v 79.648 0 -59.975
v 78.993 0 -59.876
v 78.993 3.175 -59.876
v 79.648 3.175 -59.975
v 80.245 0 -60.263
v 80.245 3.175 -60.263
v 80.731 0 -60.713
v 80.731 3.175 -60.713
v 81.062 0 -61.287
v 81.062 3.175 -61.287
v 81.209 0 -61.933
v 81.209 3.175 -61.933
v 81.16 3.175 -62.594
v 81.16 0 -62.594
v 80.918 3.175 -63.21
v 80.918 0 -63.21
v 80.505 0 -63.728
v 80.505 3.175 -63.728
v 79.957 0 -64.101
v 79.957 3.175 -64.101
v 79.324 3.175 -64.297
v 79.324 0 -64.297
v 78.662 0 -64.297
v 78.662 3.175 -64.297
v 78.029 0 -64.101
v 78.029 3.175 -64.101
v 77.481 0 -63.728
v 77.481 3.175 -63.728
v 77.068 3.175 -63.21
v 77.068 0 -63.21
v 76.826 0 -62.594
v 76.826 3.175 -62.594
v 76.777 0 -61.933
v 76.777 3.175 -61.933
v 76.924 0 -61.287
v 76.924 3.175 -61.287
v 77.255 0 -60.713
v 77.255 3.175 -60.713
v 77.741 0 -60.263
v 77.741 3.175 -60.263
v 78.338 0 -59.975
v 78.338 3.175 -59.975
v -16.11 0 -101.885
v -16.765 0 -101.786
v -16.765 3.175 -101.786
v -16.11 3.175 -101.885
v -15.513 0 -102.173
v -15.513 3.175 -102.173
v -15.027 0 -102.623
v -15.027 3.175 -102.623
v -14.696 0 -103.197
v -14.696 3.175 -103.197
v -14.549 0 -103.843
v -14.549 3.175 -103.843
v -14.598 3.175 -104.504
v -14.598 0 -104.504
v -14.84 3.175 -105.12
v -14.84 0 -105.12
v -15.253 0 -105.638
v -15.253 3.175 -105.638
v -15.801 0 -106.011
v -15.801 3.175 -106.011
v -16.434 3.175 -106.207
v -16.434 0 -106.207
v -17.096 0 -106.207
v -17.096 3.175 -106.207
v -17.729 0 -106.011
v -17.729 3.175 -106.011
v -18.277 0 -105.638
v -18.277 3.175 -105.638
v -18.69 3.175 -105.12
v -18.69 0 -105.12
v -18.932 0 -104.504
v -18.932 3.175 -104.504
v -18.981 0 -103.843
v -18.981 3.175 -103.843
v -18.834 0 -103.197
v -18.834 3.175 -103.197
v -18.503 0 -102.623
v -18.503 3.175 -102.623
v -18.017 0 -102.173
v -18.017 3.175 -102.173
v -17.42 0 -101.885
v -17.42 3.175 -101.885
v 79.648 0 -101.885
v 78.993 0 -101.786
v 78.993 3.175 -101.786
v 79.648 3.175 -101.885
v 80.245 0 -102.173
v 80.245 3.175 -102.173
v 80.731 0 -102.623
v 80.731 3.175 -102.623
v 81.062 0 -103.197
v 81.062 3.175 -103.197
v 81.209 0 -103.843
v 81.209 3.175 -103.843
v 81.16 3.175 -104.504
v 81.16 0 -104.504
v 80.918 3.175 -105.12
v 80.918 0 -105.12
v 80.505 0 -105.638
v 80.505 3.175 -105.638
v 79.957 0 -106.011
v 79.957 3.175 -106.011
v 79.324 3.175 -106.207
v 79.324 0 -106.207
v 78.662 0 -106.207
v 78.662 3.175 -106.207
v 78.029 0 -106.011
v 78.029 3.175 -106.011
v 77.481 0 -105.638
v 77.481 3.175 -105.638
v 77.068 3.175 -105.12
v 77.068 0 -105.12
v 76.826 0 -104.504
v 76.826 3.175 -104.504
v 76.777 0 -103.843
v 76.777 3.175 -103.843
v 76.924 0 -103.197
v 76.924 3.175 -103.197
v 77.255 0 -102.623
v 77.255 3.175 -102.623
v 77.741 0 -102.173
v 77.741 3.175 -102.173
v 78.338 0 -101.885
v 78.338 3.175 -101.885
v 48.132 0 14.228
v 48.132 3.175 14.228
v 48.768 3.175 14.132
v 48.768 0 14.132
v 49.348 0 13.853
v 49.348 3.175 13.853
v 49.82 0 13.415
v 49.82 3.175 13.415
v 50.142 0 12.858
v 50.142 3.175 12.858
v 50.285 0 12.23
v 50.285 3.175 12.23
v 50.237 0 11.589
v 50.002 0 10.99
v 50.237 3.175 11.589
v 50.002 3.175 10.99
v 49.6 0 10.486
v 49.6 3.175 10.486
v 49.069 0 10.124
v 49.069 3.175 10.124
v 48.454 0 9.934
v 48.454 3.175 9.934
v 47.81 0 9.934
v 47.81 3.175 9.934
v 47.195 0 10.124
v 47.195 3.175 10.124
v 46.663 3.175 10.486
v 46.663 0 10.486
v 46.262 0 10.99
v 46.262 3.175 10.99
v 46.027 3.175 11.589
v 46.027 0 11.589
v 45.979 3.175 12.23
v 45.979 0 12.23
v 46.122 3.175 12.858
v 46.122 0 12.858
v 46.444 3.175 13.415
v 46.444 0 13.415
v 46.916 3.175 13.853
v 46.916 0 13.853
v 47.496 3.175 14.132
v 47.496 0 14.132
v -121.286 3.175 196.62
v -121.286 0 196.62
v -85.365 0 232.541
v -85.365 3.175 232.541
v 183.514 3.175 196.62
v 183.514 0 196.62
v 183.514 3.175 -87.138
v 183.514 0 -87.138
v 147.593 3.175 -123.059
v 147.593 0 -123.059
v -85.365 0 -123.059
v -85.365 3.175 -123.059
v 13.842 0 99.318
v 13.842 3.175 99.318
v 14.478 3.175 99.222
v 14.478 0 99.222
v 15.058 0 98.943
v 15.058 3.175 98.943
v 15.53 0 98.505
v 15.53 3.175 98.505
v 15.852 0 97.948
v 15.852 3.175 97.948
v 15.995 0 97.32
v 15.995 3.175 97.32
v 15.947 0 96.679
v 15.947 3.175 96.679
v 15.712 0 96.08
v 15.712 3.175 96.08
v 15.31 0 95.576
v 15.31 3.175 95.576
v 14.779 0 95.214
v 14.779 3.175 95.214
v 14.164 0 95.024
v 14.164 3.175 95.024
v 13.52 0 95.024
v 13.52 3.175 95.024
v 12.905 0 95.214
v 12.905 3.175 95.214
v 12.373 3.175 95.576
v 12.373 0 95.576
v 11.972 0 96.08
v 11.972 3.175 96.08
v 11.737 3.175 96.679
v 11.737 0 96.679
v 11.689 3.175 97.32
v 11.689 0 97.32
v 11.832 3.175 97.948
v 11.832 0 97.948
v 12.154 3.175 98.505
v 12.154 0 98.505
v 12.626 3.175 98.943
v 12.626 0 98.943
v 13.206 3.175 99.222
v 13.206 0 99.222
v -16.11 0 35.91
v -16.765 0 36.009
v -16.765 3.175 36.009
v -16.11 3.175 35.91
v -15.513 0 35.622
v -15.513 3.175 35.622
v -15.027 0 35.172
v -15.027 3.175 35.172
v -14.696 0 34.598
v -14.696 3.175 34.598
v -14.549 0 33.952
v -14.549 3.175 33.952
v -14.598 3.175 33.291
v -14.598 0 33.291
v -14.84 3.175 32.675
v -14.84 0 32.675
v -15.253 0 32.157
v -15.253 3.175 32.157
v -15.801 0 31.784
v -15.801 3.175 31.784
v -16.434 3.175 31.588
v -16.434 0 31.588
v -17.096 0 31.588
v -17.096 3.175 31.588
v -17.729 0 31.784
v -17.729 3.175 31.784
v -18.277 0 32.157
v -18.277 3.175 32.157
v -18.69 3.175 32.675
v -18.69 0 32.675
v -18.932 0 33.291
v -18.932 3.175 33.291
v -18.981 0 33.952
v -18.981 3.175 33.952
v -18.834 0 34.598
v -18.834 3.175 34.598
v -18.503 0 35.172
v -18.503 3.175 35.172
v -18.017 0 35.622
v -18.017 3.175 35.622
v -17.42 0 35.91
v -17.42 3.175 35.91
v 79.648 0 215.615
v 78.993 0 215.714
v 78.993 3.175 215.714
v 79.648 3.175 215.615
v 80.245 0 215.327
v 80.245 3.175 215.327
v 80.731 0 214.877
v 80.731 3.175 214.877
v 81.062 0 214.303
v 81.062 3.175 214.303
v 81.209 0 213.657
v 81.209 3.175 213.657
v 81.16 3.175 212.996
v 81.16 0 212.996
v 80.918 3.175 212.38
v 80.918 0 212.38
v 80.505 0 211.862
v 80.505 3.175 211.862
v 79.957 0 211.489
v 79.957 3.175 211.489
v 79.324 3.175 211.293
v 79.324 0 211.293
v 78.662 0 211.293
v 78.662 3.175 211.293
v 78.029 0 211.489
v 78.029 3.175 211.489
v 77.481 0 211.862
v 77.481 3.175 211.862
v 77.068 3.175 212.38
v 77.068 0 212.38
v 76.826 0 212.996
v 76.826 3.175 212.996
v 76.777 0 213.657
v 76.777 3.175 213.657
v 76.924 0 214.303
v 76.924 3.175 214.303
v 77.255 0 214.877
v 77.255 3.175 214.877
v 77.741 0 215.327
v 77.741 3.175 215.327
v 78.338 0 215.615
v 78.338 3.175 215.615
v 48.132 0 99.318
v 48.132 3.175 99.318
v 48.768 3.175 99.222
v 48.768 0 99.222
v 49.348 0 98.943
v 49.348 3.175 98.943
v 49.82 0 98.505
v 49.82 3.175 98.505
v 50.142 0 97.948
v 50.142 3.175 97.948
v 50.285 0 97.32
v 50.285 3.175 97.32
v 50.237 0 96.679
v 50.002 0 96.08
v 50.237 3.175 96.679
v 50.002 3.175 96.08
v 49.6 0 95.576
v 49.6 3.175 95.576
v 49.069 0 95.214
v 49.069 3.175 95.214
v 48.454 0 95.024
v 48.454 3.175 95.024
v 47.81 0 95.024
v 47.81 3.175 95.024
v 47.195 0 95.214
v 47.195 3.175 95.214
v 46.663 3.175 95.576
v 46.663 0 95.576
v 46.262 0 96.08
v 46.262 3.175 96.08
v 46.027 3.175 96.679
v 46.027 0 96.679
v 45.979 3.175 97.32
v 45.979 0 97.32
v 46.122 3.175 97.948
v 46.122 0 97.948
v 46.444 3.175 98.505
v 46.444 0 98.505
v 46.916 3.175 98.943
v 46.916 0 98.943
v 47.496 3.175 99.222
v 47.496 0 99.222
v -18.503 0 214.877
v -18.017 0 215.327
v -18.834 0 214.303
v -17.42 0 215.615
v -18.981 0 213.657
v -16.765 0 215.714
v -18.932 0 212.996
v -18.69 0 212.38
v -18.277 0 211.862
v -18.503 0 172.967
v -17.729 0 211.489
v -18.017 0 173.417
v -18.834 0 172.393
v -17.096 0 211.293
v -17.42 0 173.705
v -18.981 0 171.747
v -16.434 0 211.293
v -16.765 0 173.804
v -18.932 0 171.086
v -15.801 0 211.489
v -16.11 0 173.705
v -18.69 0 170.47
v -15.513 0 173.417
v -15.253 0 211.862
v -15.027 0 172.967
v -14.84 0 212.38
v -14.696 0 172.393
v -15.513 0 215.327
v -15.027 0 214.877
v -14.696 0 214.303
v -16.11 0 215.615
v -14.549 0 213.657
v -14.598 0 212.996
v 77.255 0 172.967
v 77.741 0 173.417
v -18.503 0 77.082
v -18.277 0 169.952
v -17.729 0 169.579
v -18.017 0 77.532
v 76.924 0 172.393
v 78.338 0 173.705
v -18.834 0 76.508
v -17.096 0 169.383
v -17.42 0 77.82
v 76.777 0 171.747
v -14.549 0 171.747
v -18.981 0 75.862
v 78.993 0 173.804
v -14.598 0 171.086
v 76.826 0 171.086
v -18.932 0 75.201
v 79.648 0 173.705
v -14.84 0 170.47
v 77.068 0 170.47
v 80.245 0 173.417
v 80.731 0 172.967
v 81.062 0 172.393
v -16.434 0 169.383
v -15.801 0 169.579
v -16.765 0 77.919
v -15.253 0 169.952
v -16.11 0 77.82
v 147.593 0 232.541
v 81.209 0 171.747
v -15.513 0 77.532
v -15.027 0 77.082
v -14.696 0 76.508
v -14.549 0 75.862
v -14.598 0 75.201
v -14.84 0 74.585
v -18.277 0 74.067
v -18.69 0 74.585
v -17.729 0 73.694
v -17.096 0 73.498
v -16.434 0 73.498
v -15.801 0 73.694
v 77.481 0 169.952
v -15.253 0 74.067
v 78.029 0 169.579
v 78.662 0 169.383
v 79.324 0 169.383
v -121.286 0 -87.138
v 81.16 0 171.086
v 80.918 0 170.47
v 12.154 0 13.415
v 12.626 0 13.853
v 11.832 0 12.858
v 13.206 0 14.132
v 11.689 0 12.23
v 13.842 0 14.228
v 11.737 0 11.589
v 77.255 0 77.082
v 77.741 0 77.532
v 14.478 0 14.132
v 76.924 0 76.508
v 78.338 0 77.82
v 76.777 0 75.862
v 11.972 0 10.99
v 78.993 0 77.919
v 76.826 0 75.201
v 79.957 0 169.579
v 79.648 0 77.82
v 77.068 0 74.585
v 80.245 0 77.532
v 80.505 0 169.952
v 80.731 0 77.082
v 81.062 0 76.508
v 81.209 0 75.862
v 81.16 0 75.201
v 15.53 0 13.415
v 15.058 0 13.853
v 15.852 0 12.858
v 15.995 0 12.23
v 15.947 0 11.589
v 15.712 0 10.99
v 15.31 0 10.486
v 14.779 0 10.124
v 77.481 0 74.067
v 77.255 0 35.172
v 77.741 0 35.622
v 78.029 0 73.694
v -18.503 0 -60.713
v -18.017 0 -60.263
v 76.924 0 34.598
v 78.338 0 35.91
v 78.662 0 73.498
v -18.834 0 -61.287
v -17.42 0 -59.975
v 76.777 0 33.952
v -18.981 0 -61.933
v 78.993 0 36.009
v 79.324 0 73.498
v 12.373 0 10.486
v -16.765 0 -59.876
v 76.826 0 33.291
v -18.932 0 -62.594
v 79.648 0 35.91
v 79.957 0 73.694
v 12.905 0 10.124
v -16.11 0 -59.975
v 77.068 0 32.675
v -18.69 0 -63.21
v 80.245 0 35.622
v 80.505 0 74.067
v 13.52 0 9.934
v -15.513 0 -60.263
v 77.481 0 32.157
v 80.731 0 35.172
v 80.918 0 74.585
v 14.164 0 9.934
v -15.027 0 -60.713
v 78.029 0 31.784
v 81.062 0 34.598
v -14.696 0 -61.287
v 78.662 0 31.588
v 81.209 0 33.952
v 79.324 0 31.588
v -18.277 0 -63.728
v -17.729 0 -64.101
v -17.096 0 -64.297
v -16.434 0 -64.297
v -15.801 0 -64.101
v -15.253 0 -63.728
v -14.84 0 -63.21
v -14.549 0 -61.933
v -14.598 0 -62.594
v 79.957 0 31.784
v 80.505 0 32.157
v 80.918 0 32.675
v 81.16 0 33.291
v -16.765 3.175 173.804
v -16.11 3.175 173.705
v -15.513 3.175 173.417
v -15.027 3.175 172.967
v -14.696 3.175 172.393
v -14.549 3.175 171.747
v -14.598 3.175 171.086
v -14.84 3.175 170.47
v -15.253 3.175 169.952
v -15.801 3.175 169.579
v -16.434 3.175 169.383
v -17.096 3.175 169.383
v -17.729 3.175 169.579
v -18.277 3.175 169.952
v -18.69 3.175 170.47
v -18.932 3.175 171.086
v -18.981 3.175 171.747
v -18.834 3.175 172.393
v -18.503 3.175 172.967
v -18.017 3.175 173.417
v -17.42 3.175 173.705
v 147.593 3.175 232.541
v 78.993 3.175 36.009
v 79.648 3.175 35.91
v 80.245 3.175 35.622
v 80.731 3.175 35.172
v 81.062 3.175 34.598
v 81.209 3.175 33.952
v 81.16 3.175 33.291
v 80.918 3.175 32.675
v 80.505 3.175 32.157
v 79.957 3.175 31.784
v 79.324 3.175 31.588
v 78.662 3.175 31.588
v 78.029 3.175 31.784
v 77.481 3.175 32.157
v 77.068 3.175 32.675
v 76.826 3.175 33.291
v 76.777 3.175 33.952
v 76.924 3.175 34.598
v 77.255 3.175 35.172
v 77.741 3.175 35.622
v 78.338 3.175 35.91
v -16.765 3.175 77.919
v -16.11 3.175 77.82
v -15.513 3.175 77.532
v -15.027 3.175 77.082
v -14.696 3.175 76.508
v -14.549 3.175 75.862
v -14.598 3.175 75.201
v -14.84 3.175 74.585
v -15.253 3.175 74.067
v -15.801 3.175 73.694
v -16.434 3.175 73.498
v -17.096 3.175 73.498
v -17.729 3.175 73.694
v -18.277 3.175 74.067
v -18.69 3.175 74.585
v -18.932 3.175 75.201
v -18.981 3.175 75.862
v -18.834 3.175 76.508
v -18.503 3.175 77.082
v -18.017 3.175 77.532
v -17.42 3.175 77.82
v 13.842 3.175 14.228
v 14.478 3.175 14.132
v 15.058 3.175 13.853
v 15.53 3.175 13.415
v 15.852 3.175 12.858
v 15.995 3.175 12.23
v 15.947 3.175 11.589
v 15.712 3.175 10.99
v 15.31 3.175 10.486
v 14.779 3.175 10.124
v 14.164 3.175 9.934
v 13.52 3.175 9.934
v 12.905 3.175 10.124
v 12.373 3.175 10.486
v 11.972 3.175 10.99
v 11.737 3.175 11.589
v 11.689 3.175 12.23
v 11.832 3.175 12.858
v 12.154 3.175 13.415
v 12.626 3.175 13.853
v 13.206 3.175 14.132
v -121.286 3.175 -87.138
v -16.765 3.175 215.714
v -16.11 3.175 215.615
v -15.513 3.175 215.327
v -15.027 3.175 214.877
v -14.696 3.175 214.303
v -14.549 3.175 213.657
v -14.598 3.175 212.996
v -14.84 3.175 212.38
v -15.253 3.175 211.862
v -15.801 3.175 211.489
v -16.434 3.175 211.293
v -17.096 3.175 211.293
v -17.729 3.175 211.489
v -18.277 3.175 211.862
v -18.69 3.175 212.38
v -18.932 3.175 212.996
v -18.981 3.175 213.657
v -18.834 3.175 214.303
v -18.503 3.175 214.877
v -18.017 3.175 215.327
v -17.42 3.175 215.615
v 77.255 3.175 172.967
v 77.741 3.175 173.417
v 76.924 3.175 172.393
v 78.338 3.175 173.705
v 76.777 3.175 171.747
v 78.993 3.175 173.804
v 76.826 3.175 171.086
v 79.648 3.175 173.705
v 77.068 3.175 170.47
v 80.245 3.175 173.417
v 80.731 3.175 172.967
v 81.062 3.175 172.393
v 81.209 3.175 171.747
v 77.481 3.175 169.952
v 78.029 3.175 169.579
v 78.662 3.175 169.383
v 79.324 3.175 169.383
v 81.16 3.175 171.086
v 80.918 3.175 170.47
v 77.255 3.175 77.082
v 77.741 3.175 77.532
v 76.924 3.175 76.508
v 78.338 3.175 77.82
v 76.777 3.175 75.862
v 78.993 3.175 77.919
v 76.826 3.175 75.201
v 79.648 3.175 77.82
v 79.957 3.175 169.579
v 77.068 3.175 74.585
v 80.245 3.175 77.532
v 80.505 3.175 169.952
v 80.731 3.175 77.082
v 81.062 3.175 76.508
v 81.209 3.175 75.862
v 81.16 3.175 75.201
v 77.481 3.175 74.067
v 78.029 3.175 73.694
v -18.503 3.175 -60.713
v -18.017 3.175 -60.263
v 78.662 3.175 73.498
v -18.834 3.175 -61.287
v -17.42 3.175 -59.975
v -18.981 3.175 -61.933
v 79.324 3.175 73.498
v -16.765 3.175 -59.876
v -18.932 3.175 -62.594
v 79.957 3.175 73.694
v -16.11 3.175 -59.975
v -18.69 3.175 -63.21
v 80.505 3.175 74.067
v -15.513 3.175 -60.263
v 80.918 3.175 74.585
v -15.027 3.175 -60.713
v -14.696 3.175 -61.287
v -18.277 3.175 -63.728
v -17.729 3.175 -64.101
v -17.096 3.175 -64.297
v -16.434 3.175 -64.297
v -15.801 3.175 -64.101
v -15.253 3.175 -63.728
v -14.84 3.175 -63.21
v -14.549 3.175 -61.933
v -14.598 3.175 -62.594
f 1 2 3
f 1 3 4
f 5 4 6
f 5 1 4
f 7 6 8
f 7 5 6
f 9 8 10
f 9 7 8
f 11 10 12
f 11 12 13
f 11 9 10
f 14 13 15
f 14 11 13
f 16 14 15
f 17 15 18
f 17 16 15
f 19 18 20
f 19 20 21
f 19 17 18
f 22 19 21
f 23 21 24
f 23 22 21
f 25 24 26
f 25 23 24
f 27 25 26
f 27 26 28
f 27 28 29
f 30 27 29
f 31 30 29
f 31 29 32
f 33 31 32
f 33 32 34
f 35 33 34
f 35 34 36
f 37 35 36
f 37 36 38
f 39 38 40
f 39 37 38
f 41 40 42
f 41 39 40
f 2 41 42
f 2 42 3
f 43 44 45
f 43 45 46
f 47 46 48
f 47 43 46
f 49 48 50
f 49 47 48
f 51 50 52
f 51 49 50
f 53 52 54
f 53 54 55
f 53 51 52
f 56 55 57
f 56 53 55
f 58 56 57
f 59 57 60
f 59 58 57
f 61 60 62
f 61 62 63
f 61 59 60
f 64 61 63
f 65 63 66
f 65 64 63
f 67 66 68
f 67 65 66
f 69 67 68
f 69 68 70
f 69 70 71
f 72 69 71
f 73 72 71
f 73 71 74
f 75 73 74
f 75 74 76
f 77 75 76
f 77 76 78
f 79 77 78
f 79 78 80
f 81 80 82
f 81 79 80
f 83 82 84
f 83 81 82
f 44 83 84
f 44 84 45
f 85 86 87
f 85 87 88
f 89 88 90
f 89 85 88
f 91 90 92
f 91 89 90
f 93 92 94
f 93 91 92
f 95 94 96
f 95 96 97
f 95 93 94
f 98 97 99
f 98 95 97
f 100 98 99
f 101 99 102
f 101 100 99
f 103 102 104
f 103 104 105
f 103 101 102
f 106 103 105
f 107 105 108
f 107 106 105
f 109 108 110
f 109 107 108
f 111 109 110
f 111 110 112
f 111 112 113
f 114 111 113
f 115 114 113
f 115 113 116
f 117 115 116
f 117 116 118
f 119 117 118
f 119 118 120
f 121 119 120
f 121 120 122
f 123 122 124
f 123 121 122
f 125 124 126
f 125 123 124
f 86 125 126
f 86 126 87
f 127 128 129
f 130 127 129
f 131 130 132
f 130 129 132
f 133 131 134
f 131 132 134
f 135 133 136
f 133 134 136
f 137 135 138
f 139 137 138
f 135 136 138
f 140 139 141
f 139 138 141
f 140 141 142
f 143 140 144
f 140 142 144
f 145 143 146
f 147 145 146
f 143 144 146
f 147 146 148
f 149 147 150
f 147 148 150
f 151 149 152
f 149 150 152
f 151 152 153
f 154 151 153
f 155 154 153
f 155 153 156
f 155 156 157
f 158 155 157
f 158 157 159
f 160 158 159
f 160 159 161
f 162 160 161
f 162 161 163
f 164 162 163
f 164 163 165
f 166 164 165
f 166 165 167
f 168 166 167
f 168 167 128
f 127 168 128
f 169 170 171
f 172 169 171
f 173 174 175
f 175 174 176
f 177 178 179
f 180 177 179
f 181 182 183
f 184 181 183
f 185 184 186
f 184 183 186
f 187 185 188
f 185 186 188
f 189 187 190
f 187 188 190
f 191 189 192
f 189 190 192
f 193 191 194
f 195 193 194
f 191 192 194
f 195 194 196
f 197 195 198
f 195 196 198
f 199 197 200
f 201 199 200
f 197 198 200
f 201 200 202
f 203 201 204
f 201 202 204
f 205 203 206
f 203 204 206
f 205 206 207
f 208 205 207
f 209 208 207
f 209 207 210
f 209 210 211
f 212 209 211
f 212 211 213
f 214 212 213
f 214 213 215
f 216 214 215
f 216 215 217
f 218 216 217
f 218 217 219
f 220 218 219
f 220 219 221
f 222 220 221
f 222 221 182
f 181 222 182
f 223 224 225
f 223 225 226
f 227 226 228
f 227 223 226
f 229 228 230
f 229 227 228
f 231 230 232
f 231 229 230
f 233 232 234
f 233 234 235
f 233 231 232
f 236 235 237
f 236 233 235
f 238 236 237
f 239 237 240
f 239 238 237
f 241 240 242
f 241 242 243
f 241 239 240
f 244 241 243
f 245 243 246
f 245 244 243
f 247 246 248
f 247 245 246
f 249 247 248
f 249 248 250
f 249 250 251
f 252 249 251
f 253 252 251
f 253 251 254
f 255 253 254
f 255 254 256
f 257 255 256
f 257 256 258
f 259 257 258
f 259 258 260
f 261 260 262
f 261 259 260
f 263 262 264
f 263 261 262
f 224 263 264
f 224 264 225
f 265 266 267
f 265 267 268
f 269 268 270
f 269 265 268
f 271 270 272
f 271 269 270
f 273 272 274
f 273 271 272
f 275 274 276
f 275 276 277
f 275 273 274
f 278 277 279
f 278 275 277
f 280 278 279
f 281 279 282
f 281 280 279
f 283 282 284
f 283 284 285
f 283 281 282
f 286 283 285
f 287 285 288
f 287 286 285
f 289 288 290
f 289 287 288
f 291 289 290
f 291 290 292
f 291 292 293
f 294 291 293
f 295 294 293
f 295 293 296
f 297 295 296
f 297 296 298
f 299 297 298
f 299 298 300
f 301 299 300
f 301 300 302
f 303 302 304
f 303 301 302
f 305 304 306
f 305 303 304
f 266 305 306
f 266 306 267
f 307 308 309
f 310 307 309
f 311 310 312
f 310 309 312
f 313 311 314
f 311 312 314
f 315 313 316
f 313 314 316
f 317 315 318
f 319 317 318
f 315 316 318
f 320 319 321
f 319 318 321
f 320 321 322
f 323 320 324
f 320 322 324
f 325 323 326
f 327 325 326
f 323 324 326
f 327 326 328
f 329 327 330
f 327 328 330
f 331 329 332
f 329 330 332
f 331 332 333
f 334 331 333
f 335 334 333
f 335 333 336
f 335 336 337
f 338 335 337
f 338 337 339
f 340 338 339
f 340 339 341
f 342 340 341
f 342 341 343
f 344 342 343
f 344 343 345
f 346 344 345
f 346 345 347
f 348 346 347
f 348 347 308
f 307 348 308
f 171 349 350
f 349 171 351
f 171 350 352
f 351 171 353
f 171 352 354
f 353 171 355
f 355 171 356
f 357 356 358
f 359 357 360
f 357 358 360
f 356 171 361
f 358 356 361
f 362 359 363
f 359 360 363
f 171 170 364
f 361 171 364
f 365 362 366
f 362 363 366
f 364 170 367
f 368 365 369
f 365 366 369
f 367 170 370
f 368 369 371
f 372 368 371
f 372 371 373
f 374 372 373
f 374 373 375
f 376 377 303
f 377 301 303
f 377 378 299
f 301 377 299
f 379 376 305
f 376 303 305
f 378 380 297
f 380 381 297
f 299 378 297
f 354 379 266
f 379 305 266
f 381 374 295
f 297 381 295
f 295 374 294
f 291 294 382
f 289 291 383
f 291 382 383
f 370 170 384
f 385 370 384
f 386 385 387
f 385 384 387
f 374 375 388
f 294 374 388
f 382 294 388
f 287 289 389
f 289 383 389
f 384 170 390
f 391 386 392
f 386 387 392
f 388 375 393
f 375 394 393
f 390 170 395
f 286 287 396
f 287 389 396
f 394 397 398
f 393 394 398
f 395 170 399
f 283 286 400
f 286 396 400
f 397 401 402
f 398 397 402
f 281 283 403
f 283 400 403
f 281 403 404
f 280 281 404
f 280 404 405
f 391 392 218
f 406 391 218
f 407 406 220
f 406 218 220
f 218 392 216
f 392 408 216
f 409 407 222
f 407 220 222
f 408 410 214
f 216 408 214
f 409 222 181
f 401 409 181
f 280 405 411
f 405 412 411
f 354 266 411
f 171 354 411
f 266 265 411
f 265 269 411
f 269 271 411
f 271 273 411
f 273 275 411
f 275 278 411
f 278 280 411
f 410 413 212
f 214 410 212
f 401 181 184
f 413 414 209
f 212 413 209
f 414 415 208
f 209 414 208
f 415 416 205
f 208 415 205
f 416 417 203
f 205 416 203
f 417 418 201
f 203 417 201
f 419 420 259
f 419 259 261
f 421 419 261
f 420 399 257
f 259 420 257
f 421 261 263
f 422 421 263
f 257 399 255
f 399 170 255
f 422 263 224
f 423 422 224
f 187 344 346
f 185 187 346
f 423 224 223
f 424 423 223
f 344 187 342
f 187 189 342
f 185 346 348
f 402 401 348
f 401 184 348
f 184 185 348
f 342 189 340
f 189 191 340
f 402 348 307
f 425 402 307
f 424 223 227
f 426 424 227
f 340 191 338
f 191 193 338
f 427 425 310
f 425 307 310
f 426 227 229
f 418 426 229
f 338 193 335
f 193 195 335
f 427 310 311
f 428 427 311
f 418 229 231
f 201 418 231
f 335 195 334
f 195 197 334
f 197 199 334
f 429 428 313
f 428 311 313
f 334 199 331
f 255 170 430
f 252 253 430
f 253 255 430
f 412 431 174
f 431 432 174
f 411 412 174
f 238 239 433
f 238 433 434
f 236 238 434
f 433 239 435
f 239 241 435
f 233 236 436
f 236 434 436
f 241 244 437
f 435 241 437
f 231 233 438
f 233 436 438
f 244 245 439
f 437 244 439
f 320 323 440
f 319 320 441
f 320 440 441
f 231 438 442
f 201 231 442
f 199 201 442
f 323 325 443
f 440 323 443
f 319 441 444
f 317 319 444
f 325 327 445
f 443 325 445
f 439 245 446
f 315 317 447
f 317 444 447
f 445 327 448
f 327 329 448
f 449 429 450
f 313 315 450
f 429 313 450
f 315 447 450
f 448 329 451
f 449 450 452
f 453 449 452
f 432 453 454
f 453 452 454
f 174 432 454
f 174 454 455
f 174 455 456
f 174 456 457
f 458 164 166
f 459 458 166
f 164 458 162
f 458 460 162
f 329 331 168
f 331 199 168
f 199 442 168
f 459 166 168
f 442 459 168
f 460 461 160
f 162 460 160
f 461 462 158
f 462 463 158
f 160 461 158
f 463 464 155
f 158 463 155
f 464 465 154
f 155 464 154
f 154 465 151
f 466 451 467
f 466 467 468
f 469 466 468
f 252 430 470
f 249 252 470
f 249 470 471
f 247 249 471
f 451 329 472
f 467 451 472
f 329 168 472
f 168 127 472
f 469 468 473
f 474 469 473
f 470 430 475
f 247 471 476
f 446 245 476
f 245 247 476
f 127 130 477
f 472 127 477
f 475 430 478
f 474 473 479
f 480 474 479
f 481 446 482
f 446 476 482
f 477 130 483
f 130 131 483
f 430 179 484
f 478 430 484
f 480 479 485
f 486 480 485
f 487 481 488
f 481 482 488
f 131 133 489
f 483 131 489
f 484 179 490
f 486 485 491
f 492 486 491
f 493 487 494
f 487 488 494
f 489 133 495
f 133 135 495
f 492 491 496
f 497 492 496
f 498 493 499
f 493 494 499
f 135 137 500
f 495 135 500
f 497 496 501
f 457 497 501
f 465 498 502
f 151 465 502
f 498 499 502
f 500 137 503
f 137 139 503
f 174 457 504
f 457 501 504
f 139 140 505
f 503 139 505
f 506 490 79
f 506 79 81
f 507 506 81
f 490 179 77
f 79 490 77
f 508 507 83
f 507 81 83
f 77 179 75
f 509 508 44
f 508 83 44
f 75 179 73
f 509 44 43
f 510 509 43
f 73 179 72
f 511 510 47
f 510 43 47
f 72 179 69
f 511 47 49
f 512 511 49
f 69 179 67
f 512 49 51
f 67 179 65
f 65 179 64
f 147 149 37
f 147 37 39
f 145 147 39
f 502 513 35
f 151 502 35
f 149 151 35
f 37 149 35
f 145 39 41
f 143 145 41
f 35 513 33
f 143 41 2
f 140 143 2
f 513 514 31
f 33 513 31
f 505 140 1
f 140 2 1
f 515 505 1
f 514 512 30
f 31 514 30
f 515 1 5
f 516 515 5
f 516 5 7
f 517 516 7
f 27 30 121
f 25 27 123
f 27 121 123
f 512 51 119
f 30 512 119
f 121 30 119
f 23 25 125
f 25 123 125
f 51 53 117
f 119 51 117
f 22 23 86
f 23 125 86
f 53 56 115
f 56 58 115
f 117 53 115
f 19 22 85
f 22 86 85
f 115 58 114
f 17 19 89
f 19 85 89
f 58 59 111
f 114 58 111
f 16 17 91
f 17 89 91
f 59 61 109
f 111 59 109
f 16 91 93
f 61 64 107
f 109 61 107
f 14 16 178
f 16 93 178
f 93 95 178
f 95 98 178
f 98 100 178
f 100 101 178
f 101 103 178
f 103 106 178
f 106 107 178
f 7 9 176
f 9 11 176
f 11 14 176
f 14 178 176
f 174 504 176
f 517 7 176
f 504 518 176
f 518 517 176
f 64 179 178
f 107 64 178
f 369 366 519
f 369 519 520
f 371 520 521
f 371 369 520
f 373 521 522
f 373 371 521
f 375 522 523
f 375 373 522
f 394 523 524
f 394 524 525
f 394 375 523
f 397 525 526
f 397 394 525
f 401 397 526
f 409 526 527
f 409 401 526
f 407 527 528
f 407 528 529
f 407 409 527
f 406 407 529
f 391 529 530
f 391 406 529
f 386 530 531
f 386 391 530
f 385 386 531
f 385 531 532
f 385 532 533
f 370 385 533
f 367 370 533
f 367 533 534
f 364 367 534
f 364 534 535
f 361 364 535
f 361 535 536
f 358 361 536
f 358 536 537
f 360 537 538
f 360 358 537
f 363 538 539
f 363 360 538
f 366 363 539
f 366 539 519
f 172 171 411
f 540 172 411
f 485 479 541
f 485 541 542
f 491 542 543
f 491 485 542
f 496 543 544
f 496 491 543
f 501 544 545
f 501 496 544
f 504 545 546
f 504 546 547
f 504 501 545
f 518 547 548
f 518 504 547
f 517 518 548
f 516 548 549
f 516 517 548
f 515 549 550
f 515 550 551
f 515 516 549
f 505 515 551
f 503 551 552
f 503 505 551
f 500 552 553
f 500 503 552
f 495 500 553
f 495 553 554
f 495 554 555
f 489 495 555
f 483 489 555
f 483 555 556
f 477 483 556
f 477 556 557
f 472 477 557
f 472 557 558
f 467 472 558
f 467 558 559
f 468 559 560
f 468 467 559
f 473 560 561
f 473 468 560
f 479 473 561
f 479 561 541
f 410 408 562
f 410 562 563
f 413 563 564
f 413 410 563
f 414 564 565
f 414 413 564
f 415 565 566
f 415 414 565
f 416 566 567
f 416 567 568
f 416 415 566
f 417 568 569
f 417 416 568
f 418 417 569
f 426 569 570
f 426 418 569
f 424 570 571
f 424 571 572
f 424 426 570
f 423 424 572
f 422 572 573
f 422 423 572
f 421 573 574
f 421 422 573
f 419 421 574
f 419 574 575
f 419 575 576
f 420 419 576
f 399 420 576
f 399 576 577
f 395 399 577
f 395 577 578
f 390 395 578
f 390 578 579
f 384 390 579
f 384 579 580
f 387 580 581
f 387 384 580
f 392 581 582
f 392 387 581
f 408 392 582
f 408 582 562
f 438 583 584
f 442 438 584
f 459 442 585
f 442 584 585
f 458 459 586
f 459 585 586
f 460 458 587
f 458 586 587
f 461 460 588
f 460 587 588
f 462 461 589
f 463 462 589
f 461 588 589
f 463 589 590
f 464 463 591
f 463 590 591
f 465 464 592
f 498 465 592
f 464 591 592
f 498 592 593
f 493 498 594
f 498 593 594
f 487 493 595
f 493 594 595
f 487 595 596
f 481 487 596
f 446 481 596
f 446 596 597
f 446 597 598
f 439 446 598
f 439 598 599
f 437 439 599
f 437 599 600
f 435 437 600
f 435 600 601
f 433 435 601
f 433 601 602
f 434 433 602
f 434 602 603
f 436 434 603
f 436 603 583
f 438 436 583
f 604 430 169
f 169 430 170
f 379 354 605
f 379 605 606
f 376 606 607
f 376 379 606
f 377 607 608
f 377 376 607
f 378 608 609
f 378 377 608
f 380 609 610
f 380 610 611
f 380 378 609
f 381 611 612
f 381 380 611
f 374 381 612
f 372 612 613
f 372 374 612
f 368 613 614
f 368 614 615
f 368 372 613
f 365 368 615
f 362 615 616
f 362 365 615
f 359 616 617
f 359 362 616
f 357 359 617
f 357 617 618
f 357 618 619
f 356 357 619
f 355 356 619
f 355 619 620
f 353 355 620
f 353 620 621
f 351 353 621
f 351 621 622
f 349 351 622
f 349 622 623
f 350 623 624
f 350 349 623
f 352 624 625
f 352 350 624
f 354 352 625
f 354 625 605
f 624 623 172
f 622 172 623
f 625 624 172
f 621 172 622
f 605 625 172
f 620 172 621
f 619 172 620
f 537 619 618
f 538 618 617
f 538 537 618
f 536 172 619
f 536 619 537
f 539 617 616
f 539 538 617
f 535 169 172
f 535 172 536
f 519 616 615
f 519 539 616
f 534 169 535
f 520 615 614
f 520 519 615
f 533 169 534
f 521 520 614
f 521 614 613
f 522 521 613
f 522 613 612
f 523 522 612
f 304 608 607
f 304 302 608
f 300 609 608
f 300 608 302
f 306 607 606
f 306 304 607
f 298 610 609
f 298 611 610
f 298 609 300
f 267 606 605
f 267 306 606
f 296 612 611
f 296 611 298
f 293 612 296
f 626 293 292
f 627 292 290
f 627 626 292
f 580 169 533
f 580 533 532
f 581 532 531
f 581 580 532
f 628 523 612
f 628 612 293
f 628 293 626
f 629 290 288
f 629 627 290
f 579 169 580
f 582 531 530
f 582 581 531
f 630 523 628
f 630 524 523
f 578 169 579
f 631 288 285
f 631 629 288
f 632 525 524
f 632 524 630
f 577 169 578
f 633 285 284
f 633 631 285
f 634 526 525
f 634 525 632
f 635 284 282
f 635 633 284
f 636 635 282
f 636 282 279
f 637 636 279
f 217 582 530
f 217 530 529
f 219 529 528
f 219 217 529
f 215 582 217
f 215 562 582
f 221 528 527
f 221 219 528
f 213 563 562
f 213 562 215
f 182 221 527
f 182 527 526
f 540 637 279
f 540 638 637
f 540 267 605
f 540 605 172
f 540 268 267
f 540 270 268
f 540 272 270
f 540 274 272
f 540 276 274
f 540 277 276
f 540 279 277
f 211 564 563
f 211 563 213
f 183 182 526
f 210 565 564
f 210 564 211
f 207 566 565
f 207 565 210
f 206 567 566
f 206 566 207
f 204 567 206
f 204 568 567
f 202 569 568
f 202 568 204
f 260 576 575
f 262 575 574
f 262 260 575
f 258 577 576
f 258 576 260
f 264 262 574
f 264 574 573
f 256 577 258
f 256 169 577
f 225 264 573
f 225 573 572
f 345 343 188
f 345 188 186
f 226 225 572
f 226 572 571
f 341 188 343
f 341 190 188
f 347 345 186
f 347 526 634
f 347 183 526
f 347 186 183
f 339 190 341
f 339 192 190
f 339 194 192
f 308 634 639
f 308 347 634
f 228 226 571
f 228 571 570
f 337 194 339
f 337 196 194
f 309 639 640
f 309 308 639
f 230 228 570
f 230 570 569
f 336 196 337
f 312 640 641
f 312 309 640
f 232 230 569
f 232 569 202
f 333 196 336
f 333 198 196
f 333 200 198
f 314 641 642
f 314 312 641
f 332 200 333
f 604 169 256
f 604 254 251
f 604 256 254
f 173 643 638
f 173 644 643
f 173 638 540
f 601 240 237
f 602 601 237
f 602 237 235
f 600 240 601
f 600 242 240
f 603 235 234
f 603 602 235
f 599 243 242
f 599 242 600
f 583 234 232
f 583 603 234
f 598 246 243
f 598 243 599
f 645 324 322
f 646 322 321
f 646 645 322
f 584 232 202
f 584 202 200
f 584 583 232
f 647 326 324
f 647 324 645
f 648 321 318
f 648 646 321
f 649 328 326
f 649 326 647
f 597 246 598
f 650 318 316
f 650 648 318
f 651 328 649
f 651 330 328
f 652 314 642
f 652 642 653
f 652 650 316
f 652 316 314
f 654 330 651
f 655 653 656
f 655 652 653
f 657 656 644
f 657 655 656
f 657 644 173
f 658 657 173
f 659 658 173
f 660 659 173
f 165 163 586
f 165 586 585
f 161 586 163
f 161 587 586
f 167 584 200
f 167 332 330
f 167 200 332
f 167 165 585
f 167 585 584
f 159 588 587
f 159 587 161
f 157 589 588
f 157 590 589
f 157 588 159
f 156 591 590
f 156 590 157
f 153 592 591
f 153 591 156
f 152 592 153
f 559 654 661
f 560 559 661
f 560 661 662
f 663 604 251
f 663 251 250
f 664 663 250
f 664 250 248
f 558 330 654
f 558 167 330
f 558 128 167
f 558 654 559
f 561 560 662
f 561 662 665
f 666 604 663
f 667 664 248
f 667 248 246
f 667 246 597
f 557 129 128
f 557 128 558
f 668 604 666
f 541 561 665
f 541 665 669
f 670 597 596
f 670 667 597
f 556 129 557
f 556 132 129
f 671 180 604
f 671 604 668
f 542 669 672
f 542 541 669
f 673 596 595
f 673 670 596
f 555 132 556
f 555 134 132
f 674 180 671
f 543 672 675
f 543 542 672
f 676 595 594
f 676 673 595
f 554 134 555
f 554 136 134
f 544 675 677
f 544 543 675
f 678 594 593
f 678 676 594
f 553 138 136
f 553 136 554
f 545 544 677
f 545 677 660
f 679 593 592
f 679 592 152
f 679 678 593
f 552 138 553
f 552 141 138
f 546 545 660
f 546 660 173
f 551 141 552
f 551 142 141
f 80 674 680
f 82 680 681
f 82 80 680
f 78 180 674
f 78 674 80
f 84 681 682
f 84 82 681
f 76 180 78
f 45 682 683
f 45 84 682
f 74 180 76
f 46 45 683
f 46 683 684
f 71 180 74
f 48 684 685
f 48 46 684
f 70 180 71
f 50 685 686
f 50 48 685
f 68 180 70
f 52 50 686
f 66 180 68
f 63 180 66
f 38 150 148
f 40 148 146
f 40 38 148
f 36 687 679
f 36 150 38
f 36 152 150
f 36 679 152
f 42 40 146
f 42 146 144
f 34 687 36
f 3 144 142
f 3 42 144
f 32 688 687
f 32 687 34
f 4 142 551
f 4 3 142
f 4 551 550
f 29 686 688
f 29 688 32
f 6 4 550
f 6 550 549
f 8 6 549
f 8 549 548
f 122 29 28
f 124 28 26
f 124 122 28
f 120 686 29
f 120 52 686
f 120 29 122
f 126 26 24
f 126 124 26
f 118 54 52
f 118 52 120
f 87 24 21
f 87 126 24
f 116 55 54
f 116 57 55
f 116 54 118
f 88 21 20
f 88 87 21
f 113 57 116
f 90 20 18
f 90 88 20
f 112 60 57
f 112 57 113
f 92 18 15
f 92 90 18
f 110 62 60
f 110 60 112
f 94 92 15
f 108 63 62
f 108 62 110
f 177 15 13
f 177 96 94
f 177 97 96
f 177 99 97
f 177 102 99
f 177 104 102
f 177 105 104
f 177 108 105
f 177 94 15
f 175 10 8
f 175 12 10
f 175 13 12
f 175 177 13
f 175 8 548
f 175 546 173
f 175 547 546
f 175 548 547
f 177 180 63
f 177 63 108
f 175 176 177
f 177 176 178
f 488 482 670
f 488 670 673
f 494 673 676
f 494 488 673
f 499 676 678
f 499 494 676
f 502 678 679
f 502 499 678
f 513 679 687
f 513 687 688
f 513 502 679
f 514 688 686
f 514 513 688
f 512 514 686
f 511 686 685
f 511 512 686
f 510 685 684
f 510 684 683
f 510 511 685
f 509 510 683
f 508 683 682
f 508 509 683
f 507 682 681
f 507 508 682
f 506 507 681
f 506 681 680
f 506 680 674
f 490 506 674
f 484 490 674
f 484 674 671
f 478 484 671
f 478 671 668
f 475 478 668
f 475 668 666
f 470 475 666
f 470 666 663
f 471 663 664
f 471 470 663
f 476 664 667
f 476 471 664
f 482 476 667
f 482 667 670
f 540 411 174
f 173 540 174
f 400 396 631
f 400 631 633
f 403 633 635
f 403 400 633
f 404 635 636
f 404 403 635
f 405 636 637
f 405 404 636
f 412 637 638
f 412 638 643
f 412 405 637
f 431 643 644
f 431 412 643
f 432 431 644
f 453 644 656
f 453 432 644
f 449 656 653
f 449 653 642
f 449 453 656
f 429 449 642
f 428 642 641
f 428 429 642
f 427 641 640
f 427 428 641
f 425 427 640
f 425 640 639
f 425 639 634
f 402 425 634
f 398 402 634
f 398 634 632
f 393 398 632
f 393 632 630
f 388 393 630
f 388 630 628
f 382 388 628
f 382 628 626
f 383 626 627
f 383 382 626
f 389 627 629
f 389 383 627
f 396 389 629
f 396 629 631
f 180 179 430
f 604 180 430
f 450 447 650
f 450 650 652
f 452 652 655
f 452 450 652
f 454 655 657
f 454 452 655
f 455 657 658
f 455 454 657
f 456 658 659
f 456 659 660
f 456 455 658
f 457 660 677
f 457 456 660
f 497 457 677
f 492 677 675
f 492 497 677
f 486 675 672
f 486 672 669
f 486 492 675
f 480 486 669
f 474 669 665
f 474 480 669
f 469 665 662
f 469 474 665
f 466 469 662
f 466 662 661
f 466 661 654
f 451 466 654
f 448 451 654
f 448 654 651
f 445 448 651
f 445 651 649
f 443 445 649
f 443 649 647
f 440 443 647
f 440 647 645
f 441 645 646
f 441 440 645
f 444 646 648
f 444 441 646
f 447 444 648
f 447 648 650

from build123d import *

# Parameters (mm, degrees)
SKETCH1_R           = 2.2225
BOSS_EXTRUDE1_DEPTH = 3.175
SKETCH2_R           = 2.159
CUT_EXTRUDE1_DEPTH  = 297.247830215


with BuildPart() as part:
    # Sketch1 → Boss-Extrude1 (new body)
    with BuildSketch(Plane(origin=(0, 0, 0), x_dir=(1, 0, 0), z_dir=(0, 1, 0))):
        Polygon((-85.365028143, 123.058976948), (-121.286052627, 87.137952464), (-121.286052627, -196.619998567), (-85.365028143, -232.541023052), (147.592922888, -232.541023052), (183.513947373, -196.619998567), (183.513947373, 87.137952464), (147.592922888, 123.058976948), align=None)
        with Locations(Location((-16.765052627, -213.491023052, 0), (0, 0, 270))):
            Circle(SKETCH1_R, mode=Mode.SUBTRACT)
        with Locations(Location((-16.765052627, -171.581023052, 0), (0, 0, 270))):
            Circle(SKETCH1_R, mode=Mode.SUBTRACT)
        with Locations(Location((-16.765052627, -75.696023052, 0), (0, 0, 270))):
            Circle(SKETCH1_R, mode=Mode.SUBTRACT)
        with Locations(Location((78.992947373, -213.491023052, 0), (0, 0, 270))):
            Circle(SKETCH1_R, mode=Mode.SUBTRACT)
        with Locations(Location((78.992947373, -171.581023052, 0), (0, 0, 270))):
            Circle(SKETCH1_R, mode=Mode.SUBTRACT)
        with Locations(Location((78.992947373, -75.696023052, 0), (0, 0, 270))):
            Circle(SKETCH1_R, mode=Mode.SUBTRACT)
        with Locations(Location((-16.765052627, -33.786023052, 0), (0, 0, 270))):
            Circle(SKETCH1_R, mode=Mode.SUBTRACT)
        with Locations(Location((-16.765052627, 62.098976948, 0), (0, 0, 270))):
            Circle(SKETCH1_R, mode=Mode.SUBTRACT)
        with Locations(Location((-16.765052627, 104.008976948, 0), (0, 0, 270))):
            Circle(SKETCH1_R, mode=Mode.SUBTRACT)
        with Locations(Location((78.992947373, -33.786023052, 0), (0, 0, 270))):
            Circle(SKETCH1_R, mode=Mode.SUBTRACT)
        with Locations(Location((78.992947373, 62.098976948, 0), (0, 0, 270))):
            Circle(SKETCH1_R, mode=Mode.SUBTRACT)
        with Locations(Location((78.992947373, 104.008976948, 0), (0, 0, 270))):
            Circle(SKETCH1_R, mode=Mode.SUBTRACT)
    extrude(amount=BOSS_EXTRUDE1_DEPTH)

    # Sketch2 → Cut-Extrude1 (cut, through all)
    with BuildSketch(Plane(origin=(0, 3.175, 0), x_dir=(1, 0, 0), z_dir=(0, 1, 0))):
        with Locations(Location((13.841947373, -12.069023052, 0), (0, 0, 270))):
            Circle(SKETCH2_R)
        with Locations(Location((48.131947373, -12.069023052, 0), (0, 0, 270))):
            Circle(SKETCH2_R)
        with Locations(Location((13.841947373, -97.159023052, 0), (0, 0, 270))):
            Circle(SKETCH2_R)
        with Locations(Location((48.131947373, -97.159023052, 0), (0, 0, 270))):
            Circle(SKETCH2_R)
    extrude(amount=-CUT_EXTRUDE1_DEPTH, mode=Mode.SUBTRACT)


solid = part.part
